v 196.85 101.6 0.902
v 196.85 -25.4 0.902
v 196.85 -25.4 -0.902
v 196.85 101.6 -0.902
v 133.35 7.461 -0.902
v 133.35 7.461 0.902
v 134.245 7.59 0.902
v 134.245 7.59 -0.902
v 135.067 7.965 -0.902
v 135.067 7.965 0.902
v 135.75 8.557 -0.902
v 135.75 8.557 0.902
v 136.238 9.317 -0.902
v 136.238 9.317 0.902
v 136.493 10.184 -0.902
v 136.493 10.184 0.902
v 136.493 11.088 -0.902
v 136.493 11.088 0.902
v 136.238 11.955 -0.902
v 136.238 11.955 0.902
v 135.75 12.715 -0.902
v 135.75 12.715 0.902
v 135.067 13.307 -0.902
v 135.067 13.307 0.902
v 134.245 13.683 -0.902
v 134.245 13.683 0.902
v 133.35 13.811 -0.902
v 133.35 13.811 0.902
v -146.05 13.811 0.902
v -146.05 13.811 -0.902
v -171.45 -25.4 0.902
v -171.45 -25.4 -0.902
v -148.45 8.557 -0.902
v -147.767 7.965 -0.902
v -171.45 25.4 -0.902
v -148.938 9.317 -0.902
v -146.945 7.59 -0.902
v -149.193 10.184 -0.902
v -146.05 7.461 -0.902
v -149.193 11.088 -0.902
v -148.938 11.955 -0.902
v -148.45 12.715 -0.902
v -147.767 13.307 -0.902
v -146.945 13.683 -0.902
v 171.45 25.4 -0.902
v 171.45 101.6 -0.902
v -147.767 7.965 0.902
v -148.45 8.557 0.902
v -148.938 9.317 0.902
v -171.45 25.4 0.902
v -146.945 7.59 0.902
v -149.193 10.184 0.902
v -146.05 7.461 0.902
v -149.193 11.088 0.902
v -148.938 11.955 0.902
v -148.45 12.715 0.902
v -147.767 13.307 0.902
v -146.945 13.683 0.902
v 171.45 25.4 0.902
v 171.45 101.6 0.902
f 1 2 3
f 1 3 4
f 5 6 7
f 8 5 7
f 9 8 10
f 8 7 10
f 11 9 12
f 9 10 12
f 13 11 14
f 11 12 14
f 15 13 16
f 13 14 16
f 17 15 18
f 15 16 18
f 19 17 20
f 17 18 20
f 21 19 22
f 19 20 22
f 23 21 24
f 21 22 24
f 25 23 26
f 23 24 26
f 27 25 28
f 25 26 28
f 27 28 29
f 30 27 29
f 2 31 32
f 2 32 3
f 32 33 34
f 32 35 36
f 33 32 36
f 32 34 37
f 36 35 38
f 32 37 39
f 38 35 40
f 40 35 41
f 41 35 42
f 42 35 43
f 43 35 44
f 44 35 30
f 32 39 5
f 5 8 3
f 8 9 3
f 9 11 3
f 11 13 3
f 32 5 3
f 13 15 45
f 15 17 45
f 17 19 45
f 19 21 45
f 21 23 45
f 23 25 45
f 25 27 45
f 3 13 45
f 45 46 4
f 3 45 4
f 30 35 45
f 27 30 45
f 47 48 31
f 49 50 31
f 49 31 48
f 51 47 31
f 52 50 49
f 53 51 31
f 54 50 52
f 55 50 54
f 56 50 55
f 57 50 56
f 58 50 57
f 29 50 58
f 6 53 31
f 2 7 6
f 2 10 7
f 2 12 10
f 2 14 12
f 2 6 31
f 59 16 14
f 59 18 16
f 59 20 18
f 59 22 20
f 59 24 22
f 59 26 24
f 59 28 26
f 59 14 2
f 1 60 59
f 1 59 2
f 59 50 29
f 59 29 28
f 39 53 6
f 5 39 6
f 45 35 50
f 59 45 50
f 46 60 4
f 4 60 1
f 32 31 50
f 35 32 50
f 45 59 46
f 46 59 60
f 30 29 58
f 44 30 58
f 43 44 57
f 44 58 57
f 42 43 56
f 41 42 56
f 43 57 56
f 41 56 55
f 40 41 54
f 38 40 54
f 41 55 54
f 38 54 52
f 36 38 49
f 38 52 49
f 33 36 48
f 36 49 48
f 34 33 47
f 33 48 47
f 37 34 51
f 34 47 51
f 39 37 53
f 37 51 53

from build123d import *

# Parameters (mm, degrees)
F0_W          = 50.8
F0_H          = 1.8034
F1_DEPTH      = 171.45
F1_DEPTH_BACK = 171.45
F2_W          = 25.4
F2_H          = 127
F3_DEPTH      = 1.8034
F5_DEPTH      = 1.8044


with BuildPart() as f1:
    # F0 (on Right) → F1 (new body, two sides)
    with BuildSketch(Plane.YZ) as f1_sk:
        Rectangle(F0_W, F0_H)
    extrude(amount=F1_DEPTH)
    extrude(f1_sk.sketch, amount=-F1_DEPTH_BACK)

    # F2 (on face) → F3 (join)
    with BuildSketch(Plane.XY.offset(0.9017)):
        with Locations((184.15, 38.1)):
            Rectangle(F2_W, F2_H)
    extrude(amount=-F3_DEPTH)

    # F4 (on face) → F5 (cut, through all)
    with BuildSketch(Plane.XY.offset(0.9017)):
        with BuildLine():
            ThreePointArc((-146.05, 13.81125), (-149.225, 10.63625), (-146.05, 7.46125))
            Line((-146.05, 7.46125), (133.35, 7.46125))
            ThreePointArc((133.35, 7.46125), (136.525, 10.63625), (133.35, 13.81125))
            Line((133.35, 13.81125), (-146.05, 13.81125))
        make_face()
    extrude(amount=-F5_DEPTH, mode=Mode.SUBTRACT)


solid = f1.part
